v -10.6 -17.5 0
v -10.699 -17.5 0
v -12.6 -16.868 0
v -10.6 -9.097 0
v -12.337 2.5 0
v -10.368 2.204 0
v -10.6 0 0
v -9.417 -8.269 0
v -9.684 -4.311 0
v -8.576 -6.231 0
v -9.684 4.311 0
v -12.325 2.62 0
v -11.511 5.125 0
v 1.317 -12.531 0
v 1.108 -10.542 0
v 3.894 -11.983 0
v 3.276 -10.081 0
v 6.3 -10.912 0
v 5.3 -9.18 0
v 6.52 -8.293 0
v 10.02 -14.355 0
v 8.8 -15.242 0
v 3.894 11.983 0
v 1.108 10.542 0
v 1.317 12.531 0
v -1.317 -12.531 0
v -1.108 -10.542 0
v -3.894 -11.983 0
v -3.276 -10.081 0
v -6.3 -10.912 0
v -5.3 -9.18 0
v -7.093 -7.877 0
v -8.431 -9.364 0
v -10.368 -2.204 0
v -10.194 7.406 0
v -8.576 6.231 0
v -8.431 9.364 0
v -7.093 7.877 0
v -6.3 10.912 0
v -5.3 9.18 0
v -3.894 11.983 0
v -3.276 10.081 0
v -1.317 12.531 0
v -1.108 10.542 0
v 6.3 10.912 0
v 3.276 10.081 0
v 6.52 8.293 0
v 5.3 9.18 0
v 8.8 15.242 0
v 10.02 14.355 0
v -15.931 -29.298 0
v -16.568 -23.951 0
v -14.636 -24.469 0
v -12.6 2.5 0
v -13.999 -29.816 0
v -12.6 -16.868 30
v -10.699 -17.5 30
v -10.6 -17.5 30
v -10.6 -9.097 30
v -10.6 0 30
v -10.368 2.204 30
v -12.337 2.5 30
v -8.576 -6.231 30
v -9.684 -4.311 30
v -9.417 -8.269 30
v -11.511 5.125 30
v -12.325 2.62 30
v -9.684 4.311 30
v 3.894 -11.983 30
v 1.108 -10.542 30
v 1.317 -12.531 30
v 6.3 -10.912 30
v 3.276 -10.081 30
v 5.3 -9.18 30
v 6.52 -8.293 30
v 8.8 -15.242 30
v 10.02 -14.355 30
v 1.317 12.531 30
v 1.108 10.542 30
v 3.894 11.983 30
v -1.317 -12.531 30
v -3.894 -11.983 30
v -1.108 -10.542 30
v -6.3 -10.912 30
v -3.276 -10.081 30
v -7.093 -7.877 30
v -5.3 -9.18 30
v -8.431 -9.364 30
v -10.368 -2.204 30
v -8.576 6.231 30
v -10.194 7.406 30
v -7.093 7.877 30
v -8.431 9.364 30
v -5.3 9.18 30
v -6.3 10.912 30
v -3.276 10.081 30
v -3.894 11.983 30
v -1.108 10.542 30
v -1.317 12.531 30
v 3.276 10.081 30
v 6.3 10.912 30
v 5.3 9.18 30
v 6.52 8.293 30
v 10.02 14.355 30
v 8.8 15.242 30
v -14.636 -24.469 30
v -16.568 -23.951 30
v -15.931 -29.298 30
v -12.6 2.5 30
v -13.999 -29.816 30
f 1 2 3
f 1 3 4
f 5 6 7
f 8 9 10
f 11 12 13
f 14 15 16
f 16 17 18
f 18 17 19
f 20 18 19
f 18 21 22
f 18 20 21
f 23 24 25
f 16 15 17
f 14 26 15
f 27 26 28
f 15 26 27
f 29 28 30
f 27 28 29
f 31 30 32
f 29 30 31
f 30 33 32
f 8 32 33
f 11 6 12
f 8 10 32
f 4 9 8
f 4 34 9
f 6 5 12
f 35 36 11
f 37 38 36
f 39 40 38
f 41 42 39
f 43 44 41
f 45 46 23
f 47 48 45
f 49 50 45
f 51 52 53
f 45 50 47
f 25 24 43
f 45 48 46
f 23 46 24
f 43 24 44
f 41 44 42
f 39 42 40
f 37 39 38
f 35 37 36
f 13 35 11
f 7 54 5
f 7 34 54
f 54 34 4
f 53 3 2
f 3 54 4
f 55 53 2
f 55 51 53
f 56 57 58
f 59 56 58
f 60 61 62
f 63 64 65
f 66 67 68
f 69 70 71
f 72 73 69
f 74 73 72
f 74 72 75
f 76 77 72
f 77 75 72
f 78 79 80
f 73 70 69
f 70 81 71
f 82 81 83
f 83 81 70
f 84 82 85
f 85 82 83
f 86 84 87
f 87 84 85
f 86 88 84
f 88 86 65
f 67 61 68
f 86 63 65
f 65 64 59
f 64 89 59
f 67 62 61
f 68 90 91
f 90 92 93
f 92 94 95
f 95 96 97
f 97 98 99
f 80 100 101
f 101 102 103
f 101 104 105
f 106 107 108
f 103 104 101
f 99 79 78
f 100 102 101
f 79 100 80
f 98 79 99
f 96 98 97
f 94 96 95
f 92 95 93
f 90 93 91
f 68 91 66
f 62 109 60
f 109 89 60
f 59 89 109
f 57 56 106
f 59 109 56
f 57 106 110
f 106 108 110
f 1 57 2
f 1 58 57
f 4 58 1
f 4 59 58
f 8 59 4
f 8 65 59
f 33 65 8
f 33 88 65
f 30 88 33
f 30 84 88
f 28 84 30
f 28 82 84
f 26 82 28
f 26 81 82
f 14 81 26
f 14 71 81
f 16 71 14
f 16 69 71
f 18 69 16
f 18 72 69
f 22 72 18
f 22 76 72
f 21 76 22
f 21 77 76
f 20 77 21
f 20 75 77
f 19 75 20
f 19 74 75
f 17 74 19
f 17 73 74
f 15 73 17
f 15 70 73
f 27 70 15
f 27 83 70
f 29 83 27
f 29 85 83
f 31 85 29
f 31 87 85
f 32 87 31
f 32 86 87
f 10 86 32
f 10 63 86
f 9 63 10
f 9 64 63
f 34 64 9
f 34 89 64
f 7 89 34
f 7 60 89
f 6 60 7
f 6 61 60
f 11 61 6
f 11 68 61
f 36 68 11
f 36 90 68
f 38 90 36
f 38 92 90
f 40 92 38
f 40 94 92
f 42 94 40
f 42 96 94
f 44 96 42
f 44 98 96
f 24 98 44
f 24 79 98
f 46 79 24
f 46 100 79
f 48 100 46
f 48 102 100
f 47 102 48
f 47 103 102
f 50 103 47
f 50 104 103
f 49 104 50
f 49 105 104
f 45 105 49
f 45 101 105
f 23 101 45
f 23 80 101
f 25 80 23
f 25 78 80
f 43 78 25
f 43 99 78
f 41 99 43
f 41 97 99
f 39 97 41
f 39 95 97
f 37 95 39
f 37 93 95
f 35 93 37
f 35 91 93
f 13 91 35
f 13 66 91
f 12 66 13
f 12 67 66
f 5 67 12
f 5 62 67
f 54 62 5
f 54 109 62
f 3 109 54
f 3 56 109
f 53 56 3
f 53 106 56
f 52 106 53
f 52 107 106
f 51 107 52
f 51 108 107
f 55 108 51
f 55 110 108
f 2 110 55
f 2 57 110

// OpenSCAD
// [FL_INDEX: keywords="openscad, 3d_parametric, Hardhat_Flashlight_Clip, csg_solid" | COT="Parametric OpenSCAD design from 3DCodeverse"]
// Title: Hardhat Flashlight Clip

//overall width of clip, in mm, measure hardhat slot
clip_width=30; 

//Diameter of flashlight, in mm
diam=21.2;

//Thickness of clip, in mm
thickness=2;

//length of release tab, in mm
release_tab_length=5;

//Locking clip angle, in degrees; More angle = tighter/"snappier" fit
locking_clip_angle=15;

//Adjust this larger to reach deeper into hard hat slot
locking_clip_reach=13;

//Width of barb, in mm: Wider barb = more secure locking action
locking_clip_barb_size=2;




module insertion_tabs() //tabs at mouth of clip (draws a big wide triangle
{
polygon(points=[[0,0],[50,50*sqrt(3)],[50,-50*sqrt(3)]],path=[[0,1,2]]);
}

module insertion_tabs_trim() //trims off big triangle leaving the two tabs
{
translate([(thickness/2)*sqrt(3),0])
{
polygon(points=[[0,0],[50,50*sqrt(3)],[50,-50*sqrt(3)]],path=[[0,1,2]]);
}
difference()
{
circle(r=100);
circle(r=(diam/2)+thickness+release_tab_length);
}
}

module brace() //adds a little fillet between circle and tab
{
translate([-(diam/2)-thickness,-0.38*diam,0])
{
rotate(-55,[0,0,1])
{
square([2,7]);
}
}
}

module clip_segment1() //draws first half of tongue
{
translate([-(diam/2)-(thickness-1),-7.5,0])
{
square([2,20], center=true);
}
}


module clip_segment2() //draws second(bent) half of tongue
{
translate([-(diam/2)-(thickness-1)-(0.5*locking_clip_reach*sin(locking_clip_angle)),-(17+(0.5*locking_clip_reach*cos(locking_clip_angle))),0])
{
rotate(-locking_clip_angle,[0,0,1])
{
square([2,locking_clip_reach], center=true);
polygon(points=[[-1,-(locking_clip_reach/2)],[-1,-(locking_clip_reach/2)+5],[-1-locking_clip_barb_size,-(locking_clip_reach/2)+5]],paths=[[0,1,2]]);
}
}
}

//main body
linear_extrude(height=clip_width)
{
union()
{
difference()
{
	union()
	{
		circle(r=(diam/2)+thickness);
		insertion_tabs();
		brace();	
}	
circle(r=(diam/2));
insertion_tabs_trim();
}
clip_segment1();
clip_segment2();

}
}
